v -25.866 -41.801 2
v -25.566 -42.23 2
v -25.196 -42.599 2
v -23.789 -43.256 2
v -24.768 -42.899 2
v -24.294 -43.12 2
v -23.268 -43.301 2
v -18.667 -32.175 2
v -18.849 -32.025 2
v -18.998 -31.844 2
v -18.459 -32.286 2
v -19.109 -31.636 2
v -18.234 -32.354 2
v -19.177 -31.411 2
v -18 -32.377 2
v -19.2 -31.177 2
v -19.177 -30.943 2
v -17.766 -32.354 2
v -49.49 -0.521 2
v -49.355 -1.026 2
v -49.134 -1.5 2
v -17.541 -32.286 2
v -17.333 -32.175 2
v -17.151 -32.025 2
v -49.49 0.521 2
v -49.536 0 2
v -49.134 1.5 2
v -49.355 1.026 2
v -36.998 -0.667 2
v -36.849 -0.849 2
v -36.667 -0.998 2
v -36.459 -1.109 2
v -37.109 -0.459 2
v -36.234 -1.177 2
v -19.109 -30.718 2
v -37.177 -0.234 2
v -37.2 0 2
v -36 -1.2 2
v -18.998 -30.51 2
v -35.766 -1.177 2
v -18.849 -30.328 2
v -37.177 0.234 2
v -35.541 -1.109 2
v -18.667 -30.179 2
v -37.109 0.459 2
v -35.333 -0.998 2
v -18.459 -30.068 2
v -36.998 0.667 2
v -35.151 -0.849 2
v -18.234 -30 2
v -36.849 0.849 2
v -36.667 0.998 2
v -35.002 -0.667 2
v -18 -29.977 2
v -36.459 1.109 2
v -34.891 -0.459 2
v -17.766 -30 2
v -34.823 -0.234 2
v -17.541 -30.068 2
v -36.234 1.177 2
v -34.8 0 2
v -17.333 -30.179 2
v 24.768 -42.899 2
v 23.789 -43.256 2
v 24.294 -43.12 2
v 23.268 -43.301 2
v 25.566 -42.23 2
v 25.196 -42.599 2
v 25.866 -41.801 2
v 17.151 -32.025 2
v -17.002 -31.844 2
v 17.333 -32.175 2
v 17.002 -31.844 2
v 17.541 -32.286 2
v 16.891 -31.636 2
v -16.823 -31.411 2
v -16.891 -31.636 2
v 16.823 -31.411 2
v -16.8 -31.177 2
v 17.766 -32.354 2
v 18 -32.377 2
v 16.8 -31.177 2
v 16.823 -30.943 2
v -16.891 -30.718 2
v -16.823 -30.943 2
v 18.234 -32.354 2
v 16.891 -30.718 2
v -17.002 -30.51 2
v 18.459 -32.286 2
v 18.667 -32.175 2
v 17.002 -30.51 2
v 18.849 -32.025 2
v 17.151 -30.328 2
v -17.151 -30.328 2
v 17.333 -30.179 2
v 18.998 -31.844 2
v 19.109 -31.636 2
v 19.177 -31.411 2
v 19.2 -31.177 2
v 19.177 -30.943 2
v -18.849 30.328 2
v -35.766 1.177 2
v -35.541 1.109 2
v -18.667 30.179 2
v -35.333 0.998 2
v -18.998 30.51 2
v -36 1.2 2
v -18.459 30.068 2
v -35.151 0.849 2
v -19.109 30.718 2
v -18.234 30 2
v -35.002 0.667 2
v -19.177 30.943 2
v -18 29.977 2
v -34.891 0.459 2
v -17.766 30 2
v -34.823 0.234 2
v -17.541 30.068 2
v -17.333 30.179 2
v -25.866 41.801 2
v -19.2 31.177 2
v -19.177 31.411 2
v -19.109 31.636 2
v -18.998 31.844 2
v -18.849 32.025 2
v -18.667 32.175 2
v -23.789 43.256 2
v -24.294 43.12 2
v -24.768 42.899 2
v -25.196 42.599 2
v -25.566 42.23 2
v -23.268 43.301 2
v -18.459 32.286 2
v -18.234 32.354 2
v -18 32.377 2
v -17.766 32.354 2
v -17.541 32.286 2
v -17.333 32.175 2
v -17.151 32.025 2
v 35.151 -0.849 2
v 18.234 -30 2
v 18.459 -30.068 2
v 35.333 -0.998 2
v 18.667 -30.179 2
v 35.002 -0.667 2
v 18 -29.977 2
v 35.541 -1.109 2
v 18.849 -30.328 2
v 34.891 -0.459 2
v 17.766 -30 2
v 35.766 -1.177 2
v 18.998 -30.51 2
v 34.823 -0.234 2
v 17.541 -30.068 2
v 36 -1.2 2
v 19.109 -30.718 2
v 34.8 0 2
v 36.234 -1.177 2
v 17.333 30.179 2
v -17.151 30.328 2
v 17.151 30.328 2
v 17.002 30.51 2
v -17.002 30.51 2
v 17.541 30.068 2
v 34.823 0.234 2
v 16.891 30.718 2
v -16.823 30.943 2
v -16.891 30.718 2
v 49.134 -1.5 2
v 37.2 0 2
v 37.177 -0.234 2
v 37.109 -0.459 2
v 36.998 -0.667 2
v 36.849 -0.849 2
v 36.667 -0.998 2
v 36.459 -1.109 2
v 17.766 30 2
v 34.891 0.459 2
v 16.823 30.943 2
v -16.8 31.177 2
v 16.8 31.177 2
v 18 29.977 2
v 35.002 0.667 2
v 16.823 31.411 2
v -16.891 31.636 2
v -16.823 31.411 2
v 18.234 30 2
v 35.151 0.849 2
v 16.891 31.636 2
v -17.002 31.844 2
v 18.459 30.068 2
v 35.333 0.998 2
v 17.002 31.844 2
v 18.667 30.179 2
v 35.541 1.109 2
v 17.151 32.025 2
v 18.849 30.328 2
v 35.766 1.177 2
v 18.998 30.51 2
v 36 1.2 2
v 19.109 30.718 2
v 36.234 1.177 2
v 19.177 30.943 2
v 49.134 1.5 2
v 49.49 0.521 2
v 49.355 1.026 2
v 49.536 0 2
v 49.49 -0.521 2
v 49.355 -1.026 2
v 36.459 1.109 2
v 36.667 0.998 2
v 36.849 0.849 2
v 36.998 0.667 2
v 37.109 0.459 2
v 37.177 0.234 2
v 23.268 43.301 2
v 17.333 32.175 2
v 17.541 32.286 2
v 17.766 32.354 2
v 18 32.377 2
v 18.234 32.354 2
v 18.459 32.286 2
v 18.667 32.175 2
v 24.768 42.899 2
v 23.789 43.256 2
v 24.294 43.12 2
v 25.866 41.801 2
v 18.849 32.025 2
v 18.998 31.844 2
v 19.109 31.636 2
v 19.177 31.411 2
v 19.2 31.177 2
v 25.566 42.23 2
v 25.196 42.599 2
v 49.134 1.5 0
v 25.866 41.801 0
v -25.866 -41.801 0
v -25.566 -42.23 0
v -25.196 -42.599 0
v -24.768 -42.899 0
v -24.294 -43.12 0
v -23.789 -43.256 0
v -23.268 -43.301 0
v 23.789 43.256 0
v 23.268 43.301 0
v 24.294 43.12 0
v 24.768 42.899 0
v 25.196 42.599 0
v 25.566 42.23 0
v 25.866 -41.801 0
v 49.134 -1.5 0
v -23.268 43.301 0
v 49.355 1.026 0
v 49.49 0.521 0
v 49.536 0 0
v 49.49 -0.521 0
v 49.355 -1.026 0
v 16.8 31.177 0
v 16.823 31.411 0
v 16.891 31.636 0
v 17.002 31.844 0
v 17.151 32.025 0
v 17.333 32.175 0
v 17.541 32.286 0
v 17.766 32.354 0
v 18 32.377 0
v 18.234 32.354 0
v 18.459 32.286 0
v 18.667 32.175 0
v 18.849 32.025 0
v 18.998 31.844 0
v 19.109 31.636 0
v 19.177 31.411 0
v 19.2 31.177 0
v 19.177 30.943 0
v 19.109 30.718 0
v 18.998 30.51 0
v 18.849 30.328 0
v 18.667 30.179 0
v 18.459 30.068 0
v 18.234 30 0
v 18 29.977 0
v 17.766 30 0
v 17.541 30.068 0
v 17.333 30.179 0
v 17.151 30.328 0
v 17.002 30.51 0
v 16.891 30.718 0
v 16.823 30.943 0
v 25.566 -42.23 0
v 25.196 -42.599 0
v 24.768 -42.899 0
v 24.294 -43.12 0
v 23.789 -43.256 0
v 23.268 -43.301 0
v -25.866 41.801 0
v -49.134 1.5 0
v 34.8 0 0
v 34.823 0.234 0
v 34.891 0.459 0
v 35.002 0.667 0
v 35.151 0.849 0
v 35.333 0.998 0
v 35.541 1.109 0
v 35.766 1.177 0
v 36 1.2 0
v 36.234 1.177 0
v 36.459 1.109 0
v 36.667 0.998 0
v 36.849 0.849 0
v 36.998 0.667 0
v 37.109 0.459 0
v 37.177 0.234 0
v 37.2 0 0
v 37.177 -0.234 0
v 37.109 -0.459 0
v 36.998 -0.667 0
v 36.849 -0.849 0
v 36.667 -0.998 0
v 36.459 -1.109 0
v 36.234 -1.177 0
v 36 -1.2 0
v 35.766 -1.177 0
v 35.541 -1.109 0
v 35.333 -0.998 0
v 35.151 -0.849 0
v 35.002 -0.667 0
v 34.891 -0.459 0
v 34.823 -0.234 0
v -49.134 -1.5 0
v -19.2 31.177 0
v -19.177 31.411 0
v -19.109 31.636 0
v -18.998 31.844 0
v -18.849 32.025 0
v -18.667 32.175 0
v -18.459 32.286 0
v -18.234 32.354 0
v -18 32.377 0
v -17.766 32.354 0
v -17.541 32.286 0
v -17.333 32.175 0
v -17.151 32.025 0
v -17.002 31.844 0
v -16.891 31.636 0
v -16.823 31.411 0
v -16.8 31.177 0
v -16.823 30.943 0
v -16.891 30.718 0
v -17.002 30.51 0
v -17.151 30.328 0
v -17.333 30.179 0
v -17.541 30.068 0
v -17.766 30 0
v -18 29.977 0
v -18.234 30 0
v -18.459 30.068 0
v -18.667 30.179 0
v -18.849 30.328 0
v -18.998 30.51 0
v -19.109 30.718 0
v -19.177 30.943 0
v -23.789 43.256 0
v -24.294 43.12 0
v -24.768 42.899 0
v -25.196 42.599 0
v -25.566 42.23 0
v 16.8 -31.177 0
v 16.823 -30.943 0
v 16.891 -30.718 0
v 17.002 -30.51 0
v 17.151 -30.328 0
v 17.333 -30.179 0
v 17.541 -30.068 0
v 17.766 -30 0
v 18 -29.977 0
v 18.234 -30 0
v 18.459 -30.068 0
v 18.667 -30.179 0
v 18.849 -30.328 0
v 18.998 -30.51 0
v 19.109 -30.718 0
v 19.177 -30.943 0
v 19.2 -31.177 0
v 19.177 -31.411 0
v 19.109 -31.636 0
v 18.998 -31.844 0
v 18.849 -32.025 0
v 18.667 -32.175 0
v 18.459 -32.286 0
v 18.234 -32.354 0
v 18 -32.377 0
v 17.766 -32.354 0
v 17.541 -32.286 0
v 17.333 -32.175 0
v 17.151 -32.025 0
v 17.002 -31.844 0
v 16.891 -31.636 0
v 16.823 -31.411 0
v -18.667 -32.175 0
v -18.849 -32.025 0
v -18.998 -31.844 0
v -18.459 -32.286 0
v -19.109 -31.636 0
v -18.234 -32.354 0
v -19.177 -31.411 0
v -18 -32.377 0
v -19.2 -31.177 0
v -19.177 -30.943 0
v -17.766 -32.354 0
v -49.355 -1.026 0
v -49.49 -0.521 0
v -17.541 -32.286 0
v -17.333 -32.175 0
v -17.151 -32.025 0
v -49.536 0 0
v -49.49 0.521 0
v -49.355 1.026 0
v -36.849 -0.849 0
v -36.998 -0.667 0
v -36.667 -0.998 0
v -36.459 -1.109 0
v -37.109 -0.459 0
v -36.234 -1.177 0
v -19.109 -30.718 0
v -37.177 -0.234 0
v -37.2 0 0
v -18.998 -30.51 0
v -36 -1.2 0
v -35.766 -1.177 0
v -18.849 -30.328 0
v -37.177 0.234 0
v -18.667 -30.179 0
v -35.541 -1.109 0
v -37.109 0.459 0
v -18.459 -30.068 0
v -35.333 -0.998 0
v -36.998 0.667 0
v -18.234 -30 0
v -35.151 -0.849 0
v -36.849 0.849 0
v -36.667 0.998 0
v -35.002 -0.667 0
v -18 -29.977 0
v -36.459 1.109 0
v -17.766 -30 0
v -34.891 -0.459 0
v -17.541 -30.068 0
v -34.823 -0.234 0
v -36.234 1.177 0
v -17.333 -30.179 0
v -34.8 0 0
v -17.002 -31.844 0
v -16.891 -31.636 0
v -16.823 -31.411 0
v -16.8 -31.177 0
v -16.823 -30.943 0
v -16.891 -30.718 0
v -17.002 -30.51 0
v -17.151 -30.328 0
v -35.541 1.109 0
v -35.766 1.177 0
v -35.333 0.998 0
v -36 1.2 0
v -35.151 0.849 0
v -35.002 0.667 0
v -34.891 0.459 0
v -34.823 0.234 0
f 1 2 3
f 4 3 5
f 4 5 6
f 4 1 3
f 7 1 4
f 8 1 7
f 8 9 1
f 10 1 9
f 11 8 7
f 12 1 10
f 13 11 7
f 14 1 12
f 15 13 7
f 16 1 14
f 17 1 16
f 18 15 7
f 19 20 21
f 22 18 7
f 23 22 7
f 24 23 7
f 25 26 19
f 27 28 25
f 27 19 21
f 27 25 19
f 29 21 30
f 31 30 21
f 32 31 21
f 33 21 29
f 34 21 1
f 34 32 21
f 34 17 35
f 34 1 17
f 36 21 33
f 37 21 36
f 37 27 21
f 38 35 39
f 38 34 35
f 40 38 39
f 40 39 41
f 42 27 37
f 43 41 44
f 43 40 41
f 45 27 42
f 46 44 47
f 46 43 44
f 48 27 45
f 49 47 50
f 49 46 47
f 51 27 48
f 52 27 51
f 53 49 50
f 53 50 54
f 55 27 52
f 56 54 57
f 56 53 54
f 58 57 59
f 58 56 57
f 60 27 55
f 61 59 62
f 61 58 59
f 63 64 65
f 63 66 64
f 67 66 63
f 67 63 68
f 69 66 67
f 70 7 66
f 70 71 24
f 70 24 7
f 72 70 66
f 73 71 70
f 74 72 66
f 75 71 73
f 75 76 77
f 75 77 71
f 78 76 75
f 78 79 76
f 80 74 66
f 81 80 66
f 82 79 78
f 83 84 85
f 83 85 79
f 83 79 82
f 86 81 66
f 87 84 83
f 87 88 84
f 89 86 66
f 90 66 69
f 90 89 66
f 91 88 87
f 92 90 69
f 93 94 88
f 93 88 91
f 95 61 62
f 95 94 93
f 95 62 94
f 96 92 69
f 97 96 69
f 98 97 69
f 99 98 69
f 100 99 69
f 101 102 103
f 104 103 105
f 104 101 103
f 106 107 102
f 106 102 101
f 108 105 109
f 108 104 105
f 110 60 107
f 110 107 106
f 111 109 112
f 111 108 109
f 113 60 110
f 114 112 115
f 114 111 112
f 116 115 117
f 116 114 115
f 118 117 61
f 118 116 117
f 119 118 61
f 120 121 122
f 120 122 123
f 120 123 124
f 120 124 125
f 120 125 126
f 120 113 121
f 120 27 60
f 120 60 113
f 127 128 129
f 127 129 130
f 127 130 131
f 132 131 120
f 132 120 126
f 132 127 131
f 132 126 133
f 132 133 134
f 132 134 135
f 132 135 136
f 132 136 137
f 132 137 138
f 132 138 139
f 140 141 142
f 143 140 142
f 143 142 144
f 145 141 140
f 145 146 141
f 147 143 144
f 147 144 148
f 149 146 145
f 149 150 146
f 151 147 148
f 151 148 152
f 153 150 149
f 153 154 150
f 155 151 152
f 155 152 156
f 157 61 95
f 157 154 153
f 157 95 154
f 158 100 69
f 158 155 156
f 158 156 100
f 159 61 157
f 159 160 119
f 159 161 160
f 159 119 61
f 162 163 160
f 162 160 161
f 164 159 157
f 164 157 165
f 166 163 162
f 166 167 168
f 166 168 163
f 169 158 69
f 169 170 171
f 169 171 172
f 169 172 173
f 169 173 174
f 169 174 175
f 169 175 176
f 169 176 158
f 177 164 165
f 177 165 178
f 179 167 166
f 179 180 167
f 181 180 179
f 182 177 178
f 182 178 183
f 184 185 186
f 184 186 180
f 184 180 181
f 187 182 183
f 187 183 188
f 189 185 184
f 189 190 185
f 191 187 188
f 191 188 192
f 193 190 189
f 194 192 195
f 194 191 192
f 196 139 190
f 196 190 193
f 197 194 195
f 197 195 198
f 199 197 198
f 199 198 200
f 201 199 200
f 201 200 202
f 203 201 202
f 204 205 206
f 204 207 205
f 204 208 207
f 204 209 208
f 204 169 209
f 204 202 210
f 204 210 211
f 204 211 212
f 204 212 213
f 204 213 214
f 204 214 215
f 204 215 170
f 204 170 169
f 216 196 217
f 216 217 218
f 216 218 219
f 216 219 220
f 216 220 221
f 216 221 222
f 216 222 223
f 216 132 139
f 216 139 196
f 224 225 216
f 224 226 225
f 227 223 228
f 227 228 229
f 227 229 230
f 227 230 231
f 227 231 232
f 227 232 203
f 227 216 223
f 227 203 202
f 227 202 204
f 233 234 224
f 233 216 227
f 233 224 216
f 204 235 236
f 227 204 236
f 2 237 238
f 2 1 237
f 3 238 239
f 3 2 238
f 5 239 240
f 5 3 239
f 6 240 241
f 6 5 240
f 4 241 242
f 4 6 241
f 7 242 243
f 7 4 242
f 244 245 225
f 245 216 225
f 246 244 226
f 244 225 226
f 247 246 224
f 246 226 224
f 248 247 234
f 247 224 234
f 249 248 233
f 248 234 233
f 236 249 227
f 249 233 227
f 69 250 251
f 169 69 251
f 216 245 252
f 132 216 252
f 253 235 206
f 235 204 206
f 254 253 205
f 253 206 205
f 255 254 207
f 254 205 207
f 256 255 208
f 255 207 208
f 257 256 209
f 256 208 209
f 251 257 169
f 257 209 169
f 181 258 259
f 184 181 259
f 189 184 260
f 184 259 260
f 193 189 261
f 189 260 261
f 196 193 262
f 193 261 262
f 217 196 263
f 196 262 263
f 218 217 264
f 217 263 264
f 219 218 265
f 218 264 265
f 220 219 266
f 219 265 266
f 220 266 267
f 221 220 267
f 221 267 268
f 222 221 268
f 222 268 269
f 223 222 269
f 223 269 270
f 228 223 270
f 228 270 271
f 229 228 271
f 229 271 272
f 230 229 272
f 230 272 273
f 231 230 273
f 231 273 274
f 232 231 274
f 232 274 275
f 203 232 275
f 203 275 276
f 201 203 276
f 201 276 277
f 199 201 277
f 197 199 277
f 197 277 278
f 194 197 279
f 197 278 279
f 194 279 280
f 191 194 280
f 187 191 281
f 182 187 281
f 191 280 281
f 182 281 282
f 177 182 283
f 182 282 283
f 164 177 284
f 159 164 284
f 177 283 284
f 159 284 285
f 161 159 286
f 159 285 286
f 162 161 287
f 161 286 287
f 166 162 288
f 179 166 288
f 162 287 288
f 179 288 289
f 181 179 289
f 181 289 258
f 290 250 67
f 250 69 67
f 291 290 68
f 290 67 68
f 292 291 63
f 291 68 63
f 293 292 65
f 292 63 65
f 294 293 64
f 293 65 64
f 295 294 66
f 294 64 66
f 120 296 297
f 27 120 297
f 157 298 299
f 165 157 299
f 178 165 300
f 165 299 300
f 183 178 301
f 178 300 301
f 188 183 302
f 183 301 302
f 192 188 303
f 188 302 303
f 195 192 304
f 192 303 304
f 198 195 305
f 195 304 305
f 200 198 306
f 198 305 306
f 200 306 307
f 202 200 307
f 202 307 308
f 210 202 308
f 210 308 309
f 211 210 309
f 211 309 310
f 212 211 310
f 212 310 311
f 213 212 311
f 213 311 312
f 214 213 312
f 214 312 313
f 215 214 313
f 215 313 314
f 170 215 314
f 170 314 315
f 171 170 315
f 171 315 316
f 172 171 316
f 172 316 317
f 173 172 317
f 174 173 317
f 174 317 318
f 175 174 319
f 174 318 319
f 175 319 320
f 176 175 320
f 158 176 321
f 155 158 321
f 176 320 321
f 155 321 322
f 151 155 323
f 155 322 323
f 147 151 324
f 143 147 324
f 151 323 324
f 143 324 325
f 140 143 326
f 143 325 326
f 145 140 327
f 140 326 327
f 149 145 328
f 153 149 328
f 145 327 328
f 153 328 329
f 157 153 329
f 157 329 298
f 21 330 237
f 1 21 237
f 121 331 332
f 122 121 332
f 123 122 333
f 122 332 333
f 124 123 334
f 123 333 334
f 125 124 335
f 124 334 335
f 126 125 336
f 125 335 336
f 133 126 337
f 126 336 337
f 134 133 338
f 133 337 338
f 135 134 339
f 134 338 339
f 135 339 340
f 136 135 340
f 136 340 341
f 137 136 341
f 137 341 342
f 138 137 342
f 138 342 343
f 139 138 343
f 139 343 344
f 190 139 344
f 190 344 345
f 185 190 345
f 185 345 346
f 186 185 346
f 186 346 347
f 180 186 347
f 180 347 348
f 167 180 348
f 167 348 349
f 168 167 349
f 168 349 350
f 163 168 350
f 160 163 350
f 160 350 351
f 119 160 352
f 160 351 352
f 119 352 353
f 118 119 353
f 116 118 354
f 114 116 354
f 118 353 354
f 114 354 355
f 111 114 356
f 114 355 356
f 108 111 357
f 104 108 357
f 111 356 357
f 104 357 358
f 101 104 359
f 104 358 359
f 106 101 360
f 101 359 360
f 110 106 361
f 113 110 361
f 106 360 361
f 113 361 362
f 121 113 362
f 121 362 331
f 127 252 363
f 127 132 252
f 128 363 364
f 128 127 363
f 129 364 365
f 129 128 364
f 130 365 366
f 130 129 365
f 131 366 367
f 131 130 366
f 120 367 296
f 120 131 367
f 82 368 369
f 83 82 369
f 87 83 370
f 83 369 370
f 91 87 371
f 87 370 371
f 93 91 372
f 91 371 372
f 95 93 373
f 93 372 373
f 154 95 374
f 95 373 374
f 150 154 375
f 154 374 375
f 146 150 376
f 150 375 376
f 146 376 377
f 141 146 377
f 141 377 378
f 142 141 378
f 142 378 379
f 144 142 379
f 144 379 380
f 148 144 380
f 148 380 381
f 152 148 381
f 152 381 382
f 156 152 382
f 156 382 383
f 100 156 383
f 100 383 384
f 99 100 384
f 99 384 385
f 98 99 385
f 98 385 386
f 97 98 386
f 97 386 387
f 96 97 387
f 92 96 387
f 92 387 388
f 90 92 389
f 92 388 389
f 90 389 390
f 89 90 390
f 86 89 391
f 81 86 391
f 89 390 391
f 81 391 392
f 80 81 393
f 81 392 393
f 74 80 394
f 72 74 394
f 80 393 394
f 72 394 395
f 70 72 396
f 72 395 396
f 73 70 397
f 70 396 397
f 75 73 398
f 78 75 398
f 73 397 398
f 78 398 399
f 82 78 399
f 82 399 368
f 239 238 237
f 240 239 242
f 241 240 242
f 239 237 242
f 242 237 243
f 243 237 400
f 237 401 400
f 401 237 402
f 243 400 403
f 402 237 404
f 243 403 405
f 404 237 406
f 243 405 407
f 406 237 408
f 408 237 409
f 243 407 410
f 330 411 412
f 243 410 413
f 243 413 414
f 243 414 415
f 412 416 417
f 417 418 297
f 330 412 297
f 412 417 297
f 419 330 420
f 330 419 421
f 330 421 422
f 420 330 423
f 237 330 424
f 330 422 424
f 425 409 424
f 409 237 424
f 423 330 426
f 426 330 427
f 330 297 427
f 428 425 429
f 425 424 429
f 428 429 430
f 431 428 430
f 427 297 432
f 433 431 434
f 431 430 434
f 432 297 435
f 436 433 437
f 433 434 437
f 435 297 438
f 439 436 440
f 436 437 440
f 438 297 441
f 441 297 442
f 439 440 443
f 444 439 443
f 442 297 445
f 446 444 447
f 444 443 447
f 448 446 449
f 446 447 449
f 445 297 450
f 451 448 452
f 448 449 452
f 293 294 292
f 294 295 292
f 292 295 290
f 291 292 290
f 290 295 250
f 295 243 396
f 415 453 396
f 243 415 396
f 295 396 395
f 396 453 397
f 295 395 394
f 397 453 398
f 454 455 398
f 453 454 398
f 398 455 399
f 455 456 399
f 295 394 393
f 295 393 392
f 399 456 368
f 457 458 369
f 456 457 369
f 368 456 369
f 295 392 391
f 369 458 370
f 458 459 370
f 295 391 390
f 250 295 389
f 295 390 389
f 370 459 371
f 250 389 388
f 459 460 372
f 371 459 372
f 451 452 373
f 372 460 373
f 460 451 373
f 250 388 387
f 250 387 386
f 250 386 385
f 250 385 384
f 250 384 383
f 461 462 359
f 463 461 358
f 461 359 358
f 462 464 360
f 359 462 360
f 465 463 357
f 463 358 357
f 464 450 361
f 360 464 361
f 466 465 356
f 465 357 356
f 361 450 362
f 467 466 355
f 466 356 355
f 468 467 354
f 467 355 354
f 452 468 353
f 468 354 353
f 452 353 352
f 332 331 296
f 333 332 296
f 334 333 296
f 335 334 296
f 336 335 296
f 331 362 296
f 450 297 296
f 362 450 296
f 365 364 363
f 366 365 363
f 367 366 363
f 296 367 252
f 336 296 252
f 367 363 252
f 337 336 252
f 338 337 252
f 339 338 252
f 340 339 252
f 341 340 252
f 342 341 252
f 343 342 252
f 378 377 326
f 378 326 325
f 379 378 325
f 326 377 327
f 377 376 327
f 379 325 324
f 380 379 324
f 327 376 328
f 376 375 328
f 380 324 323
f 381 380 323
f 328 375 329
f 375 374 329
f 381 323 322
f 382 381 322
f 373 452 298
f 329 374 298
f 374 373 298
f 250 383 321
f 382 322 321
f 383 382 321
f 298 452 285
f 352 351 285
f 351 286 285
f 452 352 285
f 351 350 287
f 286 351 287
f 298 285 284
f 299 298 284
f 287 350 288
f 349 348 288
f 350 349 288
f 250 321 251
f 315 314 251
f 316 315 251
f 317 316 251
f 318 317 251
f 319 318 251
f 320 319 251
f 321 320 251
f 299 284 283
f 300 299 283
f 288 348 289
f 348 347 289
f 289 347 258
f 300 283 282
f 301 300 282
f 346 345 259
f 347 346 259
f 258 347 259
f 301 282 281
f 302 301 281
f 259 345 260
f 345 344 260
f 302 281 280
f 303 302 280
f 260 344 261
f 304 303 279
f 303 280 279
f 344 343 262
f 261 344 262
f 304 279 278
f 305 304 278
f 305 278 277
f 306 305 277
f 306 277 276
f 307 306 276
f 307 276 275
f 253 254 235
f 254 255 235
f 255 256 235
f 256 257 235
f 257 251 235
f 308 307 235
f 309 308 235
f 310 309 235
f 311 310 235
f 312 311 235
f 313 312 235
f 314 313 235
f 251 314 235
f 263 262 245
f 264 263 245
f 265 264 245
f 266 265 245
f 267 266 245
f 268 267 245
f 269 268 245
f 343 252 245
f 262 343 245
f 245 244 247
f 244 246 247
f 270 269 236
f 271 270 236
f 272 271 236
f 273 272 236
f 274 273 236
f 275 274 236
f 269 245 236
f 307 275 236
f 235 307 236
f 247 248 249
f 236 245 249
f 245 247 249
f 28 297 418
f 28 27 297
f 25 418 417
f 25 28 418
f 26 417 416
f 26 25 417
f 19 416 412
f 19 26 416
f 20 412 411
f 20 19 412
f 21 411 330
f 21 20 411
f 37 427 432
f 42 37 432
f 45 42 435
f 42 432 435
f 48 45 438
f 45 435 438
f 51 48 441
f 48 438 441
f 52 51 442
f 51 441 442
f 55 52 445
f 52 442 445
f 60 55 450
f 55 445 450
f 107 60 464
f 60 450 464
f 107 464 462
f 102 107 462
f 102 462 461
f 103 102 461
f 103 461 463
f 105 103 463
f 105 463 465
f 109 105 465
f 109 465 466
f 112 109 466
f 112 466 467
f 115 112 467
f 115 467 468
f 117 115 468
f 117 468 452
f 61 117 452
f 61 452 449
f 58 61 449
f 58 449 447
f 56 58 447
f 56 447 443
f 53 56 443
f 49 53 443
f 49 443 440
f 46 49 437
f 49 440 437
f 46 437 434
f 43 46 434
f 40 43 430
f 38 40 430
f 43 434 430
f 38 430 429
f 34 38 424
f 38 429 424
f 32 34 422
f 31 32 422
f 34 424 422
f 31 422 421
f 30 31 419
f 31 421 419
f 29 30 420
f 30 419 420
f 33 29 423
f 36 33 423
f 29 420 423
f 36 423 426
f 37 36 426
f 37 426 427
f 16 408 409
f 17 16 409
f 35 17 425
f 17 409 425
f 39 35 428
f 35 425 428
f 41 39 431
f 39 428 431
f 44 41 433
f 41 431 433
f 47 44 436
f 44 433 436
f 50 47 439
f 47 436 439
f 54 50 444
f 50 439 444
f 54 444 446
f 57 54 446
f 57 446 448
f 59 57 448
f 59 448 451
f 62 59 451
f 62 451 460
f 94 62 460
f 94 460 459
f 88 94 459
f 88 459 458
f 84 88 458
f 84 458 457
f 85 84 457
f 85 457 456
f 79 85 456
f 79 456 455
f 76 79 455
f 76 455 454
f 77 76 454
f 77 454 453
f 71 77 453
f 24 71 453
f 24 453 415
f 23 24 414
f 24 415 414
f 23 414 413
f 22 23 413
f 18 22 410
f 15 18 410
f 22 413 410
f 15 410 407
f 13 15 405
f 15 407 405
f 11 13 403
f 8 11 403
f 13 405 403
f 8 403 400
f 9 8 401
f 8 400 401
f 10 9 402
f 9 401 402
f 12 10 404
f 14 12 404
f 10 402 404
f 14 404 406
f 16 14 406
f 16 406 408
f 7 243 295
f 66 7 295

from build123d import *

# Parameters (mm, degrees)
F1_DEPTH = 2
F3_D     = 2.4
F4_R     = 3


with BuildPart() as f1:
    # F0 (on Top) → F1 (new body)
    with BuildSketch(Plane.XY):
        Polygon((25, 43.3012701892), (-25, 43.3012701892), (-50, 0), (-25, -43.3012701892), (25, -43.3012701892), (50, 0), align=None)
    extrude(amount=F1_DEPTH)

    # F3 (through all)
    with Locations(Plane.XY.offset(2)):
        with Locations((-18, 31.1769145362), (18, 31.1769145362), (36, 0), (18, -31.1769145362), (-18, -31.1769145362), (-36, 0)):
            Hole(F3_D / 2)

    # F4
    f4_edges = [f1.edges().sort_by_distance(p)[0] for p in [
        (-25, -43.30127, 1),
        (25, -43.30127, 1),
        (50, 0, 1),
        (25, 43.30127, 1),
        (-25, 43.30127, 1),
        (-50, 0, 1),
    ]]
    fillet(f4_edges, radius=F4_R)


solid = f1.part
